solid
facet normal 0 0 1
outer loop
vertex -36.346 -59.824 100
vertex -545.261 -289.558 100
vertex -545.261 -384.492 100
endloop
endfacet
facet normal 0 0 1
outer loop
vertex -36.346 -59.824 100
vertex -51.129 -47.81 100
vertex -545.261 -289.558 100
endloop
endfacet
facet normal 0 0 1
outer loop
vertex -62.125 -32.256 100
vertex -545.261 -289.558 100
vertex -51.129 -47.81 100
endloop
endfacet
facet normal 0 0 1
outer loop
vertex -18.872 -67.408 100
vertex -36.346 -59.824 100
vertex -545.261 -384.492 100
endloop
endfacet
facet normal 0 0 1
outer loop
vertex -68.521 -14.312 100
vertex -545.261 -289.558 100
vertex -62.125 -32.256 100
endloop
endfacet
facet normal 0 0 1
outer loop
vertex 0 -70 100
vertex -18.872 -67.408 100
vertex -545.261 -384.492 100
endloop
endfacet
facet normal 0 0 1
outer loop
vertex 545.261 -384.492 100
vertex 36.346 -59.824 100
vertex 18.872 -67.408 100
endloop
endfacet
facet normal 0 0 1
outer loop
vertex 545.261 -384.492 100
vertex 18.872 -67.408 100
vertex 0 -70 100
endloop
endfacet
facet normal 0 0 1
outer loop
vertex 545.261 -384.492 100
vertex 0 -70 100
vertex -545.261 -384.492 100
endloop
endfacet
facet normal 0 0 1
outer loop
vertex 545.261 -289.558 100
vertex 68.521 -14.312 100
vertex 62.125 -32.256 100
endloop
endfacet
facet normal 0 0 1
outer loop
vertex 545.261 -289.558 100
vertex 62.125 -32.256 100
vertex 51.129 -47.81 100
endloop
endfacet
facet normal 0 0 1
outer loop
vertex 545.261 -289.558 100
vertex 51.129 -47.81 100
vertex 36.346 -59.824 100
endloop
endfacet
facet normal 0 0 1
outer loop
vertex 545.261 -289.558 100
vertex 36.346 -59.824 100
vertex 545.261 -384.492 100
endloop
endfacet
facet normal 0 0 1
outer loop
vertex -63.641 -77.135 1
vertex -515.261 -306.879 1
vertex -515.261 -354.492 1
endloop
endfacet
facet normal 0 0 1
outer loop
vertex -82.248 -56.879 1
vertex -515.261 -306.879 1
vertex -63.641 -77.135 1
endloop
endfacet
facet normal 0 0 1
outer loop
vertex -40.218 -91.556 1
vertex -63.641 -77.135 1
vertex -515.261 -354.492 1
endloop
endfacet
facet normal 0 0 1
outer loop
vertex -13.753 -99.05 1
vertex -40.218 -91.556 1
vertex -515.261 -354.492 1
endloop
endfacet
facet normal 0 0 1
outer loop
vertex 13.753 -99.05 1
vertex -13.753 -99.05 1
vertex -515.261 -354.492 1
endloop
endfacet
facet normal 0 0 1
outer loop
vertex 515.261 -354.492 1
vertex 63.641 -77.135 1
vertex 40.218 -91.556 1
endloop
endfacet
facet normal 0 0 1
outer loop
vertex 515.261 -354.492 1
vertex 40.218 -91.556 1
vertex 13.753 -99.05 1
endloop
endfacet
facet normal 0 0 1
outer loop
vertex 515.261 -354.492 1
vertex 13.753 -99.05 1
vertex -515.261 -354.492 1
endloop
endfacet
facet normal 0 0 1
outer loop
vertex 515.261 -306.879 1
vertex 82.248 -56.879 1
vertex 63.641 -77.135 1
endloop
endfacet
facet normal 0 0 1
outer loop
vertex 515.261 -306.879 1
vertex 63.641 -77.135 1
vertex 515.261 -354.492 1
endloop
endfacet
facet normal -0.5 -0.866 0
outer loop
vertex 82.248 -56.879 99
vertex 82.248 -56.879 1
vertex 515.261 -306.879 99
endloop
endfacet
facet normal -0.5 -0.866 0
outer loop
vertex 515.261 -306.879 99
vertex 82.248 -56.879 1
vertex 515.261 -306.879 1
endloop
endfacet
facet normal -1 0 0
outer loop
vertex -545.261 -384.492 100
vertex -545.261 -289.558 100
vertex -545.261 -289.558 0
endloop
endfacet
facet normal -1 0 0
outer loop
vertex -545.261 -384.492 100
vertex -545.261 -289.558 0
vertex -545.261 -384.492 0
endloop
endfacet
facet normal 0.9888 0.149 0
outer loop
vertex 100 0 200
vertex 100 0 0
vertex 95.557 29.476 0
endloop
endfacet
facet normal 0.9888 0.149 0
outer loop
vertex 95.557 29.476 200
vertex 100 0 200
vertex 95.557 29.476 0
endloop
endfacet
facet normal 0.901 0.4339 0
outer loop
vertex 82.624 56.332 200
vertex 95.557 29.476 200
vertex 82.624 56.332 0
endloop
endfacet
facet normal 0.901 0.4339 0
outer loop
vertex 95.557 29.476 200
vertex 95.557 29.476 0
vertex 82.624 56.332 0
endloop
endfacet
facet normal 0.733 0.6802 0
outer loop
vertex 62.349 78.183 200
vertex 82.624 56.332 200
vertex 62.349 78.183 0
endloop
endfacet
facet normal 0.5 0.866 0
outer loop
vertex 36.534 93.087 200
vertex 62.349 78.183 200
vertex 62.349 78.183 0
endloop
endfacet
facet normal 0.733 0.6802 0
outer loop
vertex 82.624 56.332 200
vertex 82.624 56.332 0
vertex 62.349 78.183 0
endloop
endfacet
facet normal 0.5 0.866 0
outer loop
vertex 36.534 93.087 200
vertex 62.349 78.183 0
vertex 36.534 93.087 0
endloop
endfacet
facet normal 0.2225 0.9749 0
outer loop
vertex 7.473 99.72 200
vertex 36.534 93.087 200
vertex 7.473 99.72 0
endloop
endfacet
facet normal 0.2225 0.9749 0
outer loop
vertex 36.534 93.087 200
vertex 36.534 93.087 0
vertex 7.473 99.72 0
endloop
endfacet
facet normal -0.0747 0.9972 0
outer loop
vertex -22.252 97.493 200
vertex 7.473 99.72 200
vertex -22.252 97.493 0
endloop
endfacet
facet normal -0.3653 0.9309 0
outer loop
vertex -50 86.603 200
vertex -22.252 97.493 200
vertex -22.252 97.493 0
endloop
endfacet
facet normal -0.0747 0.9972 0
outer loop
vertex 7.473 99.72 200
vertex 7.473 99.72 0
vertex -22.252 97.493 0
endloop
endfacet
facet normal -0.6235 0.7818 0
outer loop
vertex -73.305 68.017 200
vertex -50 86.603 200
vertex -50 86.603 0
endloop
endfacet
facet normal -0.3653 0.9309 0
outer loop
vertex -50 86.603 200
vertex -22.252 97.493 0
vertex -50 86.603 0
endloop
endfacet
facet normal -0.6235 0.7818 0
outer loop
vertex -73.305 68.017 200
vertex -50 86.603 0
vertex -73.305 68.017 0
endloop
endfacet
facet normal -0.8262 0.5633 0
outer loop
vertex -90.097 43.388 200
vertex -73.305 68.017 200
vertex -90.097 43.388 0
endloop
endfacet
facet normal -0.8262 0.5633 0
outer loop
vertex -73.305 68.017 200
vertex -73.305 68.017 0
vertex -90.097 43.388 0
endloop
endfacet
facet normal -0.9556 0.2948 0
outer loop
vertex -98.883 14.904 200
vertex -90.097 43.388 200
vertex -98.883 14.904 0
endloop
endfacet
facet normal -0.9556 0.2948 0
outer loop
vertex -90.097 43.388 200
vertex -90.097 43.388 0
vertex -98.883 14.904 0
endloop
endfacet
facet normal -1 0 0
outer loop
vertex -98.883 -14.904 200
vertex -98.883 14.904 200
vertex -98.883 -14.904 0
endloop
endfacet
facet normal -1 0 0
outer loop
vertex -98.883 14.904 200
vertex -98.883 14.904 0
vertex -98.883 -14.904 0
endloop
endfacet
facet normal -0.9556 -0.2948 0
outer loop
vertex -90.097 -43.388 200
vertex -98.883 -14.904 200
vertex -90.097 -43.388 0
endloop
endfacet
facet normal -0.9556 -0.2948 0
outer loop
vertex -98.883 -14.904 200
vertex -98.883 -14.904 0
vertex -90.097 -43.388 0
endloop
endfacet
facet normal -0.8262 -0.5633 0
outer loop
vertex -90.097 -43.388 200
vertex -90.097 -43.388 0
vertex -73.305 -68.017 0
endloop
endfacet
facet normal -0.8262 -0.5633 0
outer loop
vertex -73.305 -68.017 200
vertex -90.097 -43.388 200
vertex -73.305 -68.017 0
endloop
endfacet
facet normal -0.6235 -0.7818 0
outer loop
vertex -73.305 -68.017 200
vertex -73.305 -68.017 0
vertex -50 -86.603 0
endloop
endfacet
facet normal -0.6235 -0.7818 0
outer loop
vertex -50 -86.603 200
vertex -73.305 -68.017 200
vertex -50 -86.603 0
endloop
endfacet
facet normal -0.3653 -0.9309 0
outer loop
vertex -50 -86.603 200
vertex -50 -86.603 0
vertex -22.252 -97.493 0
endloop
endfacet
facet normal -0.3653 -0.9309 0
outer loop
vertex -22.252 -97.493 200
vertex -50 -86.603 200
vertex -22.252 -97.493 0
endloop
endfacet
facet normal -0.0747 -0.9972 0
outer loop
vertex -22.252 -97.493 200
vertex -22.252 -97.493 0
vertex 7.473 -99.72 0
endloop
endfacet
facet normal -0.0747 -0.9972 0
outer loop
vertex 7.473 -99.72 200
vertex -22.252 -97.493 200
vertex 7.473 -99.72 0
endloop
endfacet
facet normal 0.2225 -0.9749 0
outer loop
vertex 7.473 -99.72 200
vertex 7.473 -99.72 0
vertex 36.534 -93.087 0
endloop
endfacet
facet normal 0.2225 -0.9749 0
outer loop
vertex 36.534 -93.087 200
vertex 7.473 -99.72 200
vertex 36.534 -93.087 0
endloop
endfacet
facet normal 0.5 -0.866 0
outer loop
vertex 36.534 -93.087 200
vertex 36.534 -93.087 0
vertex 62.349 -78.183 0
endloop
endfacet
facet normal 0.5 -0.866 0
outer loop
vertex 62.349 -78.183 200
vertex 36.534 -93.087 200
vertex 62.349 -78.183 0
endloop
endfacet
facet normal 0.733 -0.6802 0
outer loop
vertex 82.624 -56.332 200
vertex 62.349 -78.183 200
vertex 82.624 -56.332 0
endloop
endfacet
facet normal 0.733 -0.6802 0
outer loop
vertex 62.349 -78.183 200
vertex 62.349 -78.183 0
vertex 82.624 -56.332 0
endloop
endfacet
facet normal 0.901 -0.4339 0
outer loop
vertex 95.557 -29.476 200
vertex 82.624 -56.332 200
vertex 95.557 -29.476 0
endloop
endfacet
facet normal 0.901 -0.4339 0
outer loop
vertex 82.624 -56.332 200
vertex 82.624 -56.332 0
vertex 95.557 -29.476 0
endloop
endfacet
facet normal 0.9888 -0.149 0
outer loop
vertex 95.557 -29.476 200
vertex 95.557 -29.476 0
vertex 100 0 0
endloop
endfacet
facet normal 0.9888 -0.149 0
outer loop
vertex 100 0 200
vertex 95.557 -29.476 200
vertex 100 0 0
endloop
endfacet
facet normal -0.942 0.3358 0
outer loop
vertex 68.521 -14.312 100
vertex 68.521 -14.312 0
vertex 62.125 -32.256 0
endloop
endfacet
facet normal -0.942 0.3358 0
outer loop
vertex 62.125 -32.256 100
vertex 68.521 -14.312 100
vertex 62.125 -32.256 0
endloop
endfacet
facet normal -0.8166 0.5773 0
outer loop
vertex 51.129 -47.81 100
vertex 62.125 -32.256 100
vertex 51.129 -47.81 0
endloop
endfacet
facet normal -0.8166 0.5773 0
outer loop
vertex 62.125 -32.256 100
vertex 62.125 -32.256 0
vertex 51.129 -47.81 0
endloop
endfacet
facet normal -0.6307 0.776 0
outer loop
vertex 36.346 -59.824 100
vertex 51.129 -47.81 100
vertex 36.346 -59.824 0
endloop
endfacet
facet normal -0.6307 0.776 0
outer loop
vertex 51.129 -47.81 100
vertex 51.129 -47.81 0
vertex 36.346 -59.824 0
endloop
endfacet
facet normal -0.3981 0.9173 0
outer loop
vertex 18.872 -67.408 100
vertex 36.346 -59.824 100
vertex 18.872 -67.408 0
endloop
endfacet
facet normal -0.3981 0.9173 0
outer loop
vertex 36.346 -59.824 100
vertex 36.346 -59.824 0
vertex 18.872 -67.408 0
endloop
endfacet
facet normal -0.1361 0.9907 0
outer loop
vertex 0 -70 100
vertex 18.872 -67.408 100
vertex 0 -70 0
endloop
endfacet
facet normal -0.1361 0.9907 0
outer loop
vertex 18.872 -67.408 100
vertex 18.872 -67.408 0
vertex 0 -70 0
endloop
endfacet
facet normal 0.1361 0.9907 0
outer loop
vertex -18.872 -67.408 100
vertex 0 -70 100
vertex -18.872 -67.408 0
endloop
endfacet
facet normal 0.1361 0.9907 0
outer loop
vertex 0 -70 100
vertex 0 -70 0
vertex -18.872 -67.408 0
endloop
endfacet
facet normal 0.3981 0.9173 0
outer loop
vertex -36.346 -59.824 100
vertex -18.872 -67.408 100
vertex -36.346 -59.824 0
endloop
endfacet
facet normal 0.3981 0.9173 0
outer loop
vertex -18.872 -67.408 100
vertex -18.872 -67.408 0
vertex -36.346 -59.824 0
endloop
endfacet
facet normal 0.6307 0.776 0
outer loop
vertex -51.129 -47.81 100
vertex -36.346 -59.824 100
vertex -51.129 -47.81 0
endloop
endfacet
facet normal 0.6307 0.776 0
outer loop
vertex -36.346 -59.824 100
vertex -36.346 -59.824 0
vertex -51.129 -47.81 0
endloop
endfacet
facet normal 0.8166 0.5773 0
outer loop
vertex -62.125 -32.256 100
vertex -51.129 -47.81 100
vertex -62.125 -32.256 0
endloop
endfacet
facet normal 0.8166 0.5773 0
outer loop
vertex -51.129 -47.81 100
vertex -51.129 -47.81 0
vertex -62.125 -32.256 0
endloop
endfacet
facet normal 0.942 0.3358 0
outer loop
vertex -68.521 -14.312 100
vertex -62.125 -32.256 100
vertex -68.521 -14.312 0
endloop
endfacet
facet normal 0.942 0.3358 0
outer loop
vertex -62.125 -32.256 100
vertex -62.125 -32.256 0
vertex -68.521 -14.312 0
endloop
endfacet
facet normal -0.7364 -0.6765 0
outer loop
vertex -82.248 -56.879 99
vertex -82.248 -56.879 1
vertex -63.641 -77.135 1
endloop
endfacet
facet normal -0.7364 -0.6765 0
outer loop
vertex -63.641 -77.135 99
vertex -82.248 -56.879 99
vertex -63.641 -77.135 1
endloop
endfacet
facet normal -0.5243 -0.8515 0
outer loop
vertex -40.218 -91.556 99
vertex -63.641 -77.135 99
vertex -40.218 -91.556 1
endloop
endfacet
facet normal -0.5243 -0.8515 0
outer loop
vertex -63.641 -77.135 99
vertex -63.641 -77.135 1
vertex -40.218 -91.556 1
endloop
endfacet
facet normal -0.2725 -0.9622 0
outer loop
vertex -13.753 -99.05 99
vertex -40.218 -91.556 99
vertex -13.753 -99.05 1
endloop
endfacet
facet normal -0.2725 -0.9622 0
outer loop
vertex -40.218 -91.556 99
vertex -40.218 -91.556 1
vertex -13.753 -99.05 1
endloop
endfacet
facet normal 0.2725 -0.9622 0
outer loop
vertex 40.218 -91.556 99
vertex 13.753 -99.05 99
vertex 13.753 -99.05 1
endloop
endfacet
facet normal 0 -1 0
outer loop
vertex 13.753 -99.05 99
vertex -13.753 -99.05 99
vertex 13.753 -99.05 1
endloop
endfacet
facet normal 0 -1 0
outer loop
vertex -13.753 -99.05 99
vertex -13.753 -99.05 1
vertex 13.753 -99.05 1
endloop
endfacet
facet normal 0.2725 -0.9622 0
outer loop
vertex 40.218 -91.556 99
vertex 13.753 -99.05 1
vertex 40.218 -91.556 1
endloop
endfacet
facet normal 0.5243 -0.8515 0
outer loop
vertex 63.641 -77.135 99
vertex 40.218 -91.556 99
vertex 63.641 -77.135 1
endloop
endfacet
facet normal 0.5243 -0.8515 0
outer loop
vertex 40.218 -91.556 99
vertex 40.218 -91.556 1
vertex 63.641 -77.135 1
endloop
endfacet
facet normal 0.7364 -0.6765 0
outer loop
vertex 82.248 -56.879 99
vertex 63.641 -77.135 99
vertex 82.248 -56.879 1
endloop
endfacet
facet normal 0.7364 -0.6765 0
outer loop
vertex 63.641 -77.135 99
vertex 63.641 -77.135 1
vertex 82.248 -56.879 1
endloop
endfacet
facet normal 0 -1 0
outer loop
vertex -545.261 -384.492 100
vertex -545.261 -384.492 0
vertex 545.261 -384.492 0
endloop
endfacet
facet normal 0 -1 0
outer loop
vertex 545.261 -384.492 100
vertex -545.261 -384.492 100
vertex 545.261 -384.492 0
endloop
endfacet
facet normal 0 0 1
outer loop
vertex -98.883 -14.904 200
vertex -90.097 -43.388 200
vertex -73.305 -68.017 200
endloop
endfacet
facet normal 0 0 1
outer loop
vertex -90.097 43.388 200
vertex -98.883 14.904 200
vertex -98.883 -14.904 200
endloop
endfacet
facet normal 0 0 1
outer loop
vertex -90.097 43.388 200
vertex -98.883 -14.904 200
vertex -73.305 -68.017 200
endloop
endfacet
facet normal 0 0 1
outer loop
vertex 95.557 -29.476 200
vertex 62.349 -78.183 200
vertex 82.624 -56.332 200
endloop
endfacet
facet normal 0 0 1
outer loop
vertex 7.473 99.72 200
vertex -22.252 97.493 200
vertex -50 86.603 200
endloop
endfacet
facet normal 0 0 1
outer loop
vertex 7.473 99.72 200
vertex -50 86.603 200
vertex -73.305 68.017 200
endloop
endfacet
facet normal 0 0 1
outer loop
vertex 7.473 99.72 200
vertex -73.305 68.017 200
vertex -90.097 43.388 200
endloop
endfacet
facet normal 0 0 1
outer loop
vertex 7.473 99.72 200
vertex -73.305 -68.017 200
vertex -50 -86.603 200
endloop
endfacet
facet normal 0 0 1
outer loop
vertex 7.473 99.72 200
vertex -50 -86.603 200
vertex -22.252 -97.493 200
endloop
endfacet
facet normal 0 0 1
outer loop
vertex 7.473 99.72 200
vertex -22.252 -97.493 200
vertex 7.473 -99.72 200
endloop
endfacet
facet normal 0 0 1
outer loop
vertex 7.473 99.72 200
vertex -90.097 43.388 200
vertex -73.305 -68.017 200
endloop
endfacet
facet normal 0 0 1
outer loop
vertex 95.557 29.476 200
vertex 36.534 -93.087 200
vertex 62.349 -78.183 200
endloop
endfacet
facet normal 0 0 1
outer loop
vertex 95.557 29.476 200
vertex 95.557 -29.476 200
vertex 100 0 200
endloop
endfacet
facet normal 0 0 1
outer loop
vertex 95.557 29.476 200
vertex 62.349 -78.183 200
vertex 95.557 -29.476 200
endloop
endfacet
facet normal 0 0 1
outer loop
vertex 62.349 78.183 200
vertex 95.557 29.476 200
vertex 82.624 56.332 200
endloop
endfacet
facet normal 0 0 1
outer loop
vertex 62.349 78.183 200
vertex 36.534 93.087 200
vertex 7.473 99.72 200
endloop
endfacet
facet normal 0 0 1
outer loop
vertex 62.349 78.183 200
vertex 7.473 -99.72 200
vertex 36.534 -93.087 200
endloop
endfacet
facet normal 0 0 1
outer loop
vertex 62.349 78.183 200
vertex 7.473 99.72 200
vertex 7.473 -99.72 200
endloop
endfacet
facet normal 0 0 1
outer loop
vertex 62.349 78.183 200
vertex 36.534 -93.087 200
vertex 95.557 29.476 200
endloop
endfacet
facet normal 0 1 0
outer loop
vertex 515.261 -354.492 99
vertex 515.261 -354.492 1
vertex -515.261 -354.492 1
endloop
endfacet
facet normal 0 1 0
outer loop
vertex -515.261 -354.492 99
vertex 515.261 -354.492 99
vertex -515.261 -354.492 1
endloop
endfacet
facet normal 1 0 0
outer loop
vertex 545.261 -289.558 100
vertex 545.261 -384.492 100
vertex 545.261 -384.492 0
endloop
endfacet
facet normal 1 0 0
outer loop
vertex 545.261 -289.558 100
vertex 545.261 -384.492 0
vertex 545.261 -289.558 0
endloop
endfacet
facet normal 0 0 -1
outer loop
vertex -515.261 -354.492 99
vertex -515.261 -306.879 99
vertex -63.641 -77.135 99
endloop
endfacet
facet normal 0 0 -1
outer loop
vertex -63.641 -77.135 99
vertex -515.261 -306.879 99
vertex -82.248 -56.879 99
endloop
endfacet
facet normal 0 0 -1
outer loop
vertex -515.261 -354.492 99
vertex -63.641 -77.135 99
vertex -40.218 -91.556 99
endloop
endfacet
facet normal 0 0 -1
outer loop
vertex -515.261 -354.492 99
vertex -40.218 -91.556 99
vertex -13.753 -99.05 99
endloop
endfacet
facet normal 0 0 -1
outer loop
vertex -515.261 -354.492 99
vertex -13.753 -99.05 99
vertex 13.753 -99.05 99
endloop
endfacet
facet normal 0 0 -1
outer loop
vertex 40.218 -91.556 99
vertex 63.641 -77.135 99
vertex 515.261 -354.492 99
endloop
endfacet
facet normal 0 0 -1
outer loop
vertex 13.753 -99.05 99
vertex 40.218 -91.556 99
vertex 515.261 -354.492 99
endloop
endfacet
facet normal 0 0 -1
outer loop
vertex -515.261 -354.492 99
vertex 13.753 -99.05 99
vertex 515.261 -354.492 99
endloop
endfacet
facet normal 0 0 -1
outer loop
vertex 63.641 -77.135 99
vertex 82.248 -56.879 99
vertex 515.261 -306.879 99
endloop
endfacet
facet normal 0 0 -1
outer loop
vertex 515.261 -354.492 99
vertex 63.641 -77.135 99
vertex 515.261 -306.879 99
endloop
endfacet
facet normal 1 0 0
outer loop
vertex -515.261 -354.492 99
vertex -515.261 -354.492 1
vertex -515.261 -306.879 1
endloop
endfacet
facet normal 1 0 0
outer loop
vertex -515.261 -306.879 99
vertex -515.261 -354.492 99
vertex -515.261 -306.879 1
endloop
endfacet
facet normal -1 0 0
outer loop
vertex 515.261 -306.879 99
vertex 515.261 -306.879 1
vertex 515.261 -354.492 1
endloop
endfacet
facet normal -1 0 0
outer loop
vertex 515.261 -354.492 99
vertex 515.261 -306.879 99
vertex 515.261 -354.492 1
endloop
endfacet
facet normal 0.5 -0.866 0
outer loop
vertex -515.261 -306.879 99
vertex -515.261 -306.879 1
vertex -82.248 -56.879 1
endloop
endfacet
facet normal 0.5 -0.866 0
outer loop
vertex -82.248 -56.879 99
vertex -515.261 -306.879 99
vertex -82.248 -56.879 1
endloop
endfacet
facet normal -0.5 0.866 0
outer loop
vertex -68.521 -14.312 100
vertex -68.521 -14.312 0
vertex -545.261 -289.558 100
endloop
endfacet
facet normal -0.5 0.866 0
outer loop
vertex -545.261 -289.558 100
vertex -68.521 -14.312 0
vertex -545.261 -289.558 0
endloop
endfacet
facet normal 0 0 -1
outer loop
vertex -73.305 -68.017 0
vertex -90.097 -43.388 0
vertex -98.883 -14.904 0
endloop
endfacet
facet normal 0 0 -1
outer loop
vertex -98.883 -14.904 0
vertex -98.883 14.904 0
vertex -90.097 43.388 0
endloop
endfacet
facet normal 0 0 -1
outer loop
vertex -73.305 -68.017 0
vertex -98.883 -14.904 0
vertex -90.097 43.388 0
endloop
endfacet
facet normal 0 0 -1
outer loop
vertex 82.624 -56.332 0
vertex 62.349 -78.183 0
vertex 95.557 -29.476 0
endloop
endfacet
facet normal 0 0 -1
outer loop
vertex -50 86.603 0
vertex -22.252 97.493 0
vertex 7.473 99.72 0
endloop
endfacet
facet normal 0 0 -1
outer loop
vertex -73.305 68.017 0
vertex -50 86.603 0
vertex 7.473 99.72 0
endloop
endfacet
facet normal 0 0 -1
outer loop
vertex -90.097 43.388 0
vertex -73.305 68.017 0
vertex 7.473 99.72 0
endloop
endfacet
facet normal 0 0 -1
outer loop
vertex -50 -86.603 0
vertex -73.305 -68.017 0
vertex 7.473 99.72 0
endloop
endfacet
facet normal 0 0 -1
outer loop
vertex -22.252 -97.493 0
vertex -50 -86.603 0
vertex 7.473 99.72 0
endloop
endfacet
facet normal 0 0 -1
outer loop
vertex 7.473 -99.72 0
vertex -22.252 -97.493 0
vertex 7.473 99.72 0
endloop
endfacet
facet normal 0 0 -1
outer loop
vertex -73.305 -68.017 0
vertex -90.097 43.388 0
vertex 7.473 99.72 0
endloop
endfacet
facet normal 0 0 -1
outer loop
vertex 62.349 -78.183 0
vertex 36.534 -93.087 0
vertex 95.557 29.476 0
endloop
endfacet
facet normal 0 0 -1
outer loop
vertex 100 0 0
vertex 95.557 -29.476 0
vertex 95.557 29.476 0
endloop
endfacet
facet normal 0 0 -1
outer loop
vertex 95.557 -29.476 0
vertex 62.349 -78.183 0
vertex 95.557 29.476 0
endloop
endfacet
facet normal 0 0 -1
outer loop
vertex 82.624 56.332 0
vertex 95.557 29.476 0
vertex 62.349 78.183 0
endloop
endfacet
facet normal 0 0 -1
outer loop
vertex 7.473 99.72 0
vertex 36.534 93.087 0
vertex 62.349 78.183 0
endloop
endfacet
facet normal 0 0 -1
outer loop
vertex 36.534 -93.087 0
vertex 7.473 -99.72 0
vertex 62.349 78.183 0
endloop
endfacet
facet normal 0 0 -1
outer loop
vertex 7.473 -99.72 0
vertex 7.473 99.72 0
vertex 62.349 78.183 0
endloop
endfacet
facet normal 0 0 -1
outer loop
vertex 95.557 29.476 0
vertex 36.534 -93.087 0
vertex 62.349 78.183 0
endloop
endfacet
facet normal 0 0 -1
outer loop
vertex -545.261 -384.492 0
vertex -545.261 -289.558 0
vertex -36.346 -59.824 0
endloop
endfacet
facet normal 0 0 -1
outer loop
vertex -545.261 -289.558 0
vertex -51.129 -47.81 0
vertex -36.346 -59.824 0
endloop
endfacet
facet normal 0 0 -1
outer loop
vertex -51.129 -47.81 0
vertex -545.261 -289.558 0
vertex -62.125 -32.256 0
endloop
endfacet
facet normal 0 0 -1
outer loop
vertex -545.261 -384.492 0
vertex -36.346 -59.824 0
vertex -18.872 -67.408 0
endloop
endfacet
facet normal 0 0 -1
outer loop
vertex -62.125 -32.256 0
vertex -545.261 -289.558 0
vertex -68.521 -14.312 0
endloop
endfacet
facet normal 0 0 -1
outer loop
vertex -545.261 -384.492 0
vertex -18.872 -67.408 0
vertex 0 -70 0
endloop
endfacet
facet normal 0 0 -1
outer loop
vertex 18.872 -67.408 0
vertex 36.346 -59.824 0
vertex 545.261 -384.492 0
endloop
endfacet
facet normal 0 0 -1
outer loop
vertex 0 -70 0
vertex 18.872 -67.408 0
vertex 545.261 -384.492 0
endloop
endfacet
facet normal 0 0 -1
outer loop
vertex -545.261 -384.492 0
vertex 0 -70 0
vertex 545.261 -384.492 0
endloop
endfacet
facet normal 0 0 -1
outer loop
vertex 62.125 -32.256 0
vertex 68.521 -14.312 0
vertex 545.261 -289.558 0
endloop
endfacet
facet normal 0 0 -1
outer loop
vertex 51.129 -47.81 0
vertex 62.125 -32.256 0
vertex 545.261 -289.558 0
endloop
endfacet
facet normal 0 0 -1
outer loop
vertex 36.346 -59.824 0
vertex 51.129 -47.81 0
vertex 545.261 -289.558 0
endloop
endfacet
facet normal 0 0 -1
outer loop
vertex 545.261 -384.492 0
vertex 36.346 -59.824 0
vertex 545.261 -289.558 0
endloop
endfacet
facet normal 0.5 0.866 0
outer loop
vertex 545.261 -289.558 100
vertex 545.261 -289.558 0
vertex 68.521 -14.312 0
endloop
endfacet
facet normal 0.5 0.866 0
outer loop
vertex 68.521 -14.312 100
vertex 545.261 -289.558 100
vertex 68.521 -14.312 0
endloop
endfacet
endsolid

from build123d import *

# Parameters (mm, degrees)
SKETCH1_R             = 100
BOSS_EXTRUDE1_DEPTH   = 200
EXTRUDE_THIN1_DEPTH   = 100
EXTRUDE_THIN1_2_DEPTH = 1
EXTRUDE_THIN1_START   = 99
EXTRUDE_THIN1_3_DEPTH = 1


# Read off the part's stored shape, not the designer's step: Extrude-Thin1
with BuildPart() as part:
    # Sketch1 → Boss-Extrude1 (new body)
    with BuildSketch(Plane.XY):
        Circle(SKETCH1_R)
    extrude(amount=BOSS_EXTRUDE1_DEPTH)


with BuildPart() as body_2:
    # Extrude-Thin1 outline → Extrude-Thin1 (new body)
    with BuildSketch(Plane.XY):
        with BuildLine():
            Line((545.26106063, -289.558376275), (68.521185658, -14.312481126))
            ThreePointArc((68.521185658, -14.312481126), (0, -70), (-68.521185658, -14.312481126))
            Line((-68.521185658, -14.312481126), (-545.26106063, -289.558376275))
            Line((-545.26106063, -289.558376275), (-545.26106063, -384.491692362))
            Line((-545.26106063, -384.491692362), (545.26106063, -384.491692362))
            Line((545.26106063, -384.491692362), (545.26106063, -289.558376275))
        make_face()
        with BuildLine():
            ThreePointArc((-82.248358738, -56.87888435), (0, -100), (82.248358738, -56.87888435))
            Line((82.248358738, -56.87888435), (515.26106063, -306.87888435))
            Line((515.26106063, -306.87888435), (515.26106063, -354.491692362))
            Line((515.26106063, -354.491692362), (-515.26106063, -354.491692362))
            Line((-515.26106063, -354.491692362), (-515.26106063, -306.87888435))
            Line((-515.26106063, -306.87888435), (-82.248358738, -56.87888435))
        make_face(mode=Mode.SUBTRACT)
    extrude(amount=EXTRUDE_THIN1_DEPTH)

    # Extrude-Thin1 2 outline → Extrude-Thin1 2 (add)
    with BuildSketch(Plane.XY):
        with BuildLine():
            Line((515.26106063, -306.87888435), (82.248358738, -56.87888435))
            ThreePointArc((82.248358738, -56.87888435), (0, -100), (-82.248358738, -56.87888435))
            Line((-82.248358738, -56.87888435), (-515.26106063, -306.87888435))
            Line((-515.26106063, -306.87888435), (-515.26106063, -354.491692362))
            Line((-515.26106063, -354.491692362), (515.26106063, -354.491692362))
            Line((515.26106063, -354.491692362), (515.26106063, -306.87888435))
        make_face()
    extrude(amount=EXTRUDE_THIN1_2_DEPTH)

    # Extrude-Thin1 3 outline → Extrude-Thin1 3 (add)
    with BuildSketch(Plane.XY.offset(EXTRUDE_THIN1_START)):
        with BuildLine():
            Line((515.26106063, -306.87888435), (82.248358738, -56.87888435))
            ThreePointArc((82.248358738, -56.87888435), (0, -100), (-82.248358738, -56.87888435))
            Line((-82.248358738, -56.87888435), (-515.26106063, -306.87888435))
            Line((-515.26106063, -306.87888435), (-515.26106063, -354.491692362))
            Line((-515.26106063, -354.491692362), (515.26106063, -354.491692362))
            Line((515.26106063, -354.491692362), (515.26106063, -306.87888435))
        make_face()
    extrude(amount=EXTRUDE_THIN1_3_DEPTH)


solid = Compound([part.part, body_2.part])
